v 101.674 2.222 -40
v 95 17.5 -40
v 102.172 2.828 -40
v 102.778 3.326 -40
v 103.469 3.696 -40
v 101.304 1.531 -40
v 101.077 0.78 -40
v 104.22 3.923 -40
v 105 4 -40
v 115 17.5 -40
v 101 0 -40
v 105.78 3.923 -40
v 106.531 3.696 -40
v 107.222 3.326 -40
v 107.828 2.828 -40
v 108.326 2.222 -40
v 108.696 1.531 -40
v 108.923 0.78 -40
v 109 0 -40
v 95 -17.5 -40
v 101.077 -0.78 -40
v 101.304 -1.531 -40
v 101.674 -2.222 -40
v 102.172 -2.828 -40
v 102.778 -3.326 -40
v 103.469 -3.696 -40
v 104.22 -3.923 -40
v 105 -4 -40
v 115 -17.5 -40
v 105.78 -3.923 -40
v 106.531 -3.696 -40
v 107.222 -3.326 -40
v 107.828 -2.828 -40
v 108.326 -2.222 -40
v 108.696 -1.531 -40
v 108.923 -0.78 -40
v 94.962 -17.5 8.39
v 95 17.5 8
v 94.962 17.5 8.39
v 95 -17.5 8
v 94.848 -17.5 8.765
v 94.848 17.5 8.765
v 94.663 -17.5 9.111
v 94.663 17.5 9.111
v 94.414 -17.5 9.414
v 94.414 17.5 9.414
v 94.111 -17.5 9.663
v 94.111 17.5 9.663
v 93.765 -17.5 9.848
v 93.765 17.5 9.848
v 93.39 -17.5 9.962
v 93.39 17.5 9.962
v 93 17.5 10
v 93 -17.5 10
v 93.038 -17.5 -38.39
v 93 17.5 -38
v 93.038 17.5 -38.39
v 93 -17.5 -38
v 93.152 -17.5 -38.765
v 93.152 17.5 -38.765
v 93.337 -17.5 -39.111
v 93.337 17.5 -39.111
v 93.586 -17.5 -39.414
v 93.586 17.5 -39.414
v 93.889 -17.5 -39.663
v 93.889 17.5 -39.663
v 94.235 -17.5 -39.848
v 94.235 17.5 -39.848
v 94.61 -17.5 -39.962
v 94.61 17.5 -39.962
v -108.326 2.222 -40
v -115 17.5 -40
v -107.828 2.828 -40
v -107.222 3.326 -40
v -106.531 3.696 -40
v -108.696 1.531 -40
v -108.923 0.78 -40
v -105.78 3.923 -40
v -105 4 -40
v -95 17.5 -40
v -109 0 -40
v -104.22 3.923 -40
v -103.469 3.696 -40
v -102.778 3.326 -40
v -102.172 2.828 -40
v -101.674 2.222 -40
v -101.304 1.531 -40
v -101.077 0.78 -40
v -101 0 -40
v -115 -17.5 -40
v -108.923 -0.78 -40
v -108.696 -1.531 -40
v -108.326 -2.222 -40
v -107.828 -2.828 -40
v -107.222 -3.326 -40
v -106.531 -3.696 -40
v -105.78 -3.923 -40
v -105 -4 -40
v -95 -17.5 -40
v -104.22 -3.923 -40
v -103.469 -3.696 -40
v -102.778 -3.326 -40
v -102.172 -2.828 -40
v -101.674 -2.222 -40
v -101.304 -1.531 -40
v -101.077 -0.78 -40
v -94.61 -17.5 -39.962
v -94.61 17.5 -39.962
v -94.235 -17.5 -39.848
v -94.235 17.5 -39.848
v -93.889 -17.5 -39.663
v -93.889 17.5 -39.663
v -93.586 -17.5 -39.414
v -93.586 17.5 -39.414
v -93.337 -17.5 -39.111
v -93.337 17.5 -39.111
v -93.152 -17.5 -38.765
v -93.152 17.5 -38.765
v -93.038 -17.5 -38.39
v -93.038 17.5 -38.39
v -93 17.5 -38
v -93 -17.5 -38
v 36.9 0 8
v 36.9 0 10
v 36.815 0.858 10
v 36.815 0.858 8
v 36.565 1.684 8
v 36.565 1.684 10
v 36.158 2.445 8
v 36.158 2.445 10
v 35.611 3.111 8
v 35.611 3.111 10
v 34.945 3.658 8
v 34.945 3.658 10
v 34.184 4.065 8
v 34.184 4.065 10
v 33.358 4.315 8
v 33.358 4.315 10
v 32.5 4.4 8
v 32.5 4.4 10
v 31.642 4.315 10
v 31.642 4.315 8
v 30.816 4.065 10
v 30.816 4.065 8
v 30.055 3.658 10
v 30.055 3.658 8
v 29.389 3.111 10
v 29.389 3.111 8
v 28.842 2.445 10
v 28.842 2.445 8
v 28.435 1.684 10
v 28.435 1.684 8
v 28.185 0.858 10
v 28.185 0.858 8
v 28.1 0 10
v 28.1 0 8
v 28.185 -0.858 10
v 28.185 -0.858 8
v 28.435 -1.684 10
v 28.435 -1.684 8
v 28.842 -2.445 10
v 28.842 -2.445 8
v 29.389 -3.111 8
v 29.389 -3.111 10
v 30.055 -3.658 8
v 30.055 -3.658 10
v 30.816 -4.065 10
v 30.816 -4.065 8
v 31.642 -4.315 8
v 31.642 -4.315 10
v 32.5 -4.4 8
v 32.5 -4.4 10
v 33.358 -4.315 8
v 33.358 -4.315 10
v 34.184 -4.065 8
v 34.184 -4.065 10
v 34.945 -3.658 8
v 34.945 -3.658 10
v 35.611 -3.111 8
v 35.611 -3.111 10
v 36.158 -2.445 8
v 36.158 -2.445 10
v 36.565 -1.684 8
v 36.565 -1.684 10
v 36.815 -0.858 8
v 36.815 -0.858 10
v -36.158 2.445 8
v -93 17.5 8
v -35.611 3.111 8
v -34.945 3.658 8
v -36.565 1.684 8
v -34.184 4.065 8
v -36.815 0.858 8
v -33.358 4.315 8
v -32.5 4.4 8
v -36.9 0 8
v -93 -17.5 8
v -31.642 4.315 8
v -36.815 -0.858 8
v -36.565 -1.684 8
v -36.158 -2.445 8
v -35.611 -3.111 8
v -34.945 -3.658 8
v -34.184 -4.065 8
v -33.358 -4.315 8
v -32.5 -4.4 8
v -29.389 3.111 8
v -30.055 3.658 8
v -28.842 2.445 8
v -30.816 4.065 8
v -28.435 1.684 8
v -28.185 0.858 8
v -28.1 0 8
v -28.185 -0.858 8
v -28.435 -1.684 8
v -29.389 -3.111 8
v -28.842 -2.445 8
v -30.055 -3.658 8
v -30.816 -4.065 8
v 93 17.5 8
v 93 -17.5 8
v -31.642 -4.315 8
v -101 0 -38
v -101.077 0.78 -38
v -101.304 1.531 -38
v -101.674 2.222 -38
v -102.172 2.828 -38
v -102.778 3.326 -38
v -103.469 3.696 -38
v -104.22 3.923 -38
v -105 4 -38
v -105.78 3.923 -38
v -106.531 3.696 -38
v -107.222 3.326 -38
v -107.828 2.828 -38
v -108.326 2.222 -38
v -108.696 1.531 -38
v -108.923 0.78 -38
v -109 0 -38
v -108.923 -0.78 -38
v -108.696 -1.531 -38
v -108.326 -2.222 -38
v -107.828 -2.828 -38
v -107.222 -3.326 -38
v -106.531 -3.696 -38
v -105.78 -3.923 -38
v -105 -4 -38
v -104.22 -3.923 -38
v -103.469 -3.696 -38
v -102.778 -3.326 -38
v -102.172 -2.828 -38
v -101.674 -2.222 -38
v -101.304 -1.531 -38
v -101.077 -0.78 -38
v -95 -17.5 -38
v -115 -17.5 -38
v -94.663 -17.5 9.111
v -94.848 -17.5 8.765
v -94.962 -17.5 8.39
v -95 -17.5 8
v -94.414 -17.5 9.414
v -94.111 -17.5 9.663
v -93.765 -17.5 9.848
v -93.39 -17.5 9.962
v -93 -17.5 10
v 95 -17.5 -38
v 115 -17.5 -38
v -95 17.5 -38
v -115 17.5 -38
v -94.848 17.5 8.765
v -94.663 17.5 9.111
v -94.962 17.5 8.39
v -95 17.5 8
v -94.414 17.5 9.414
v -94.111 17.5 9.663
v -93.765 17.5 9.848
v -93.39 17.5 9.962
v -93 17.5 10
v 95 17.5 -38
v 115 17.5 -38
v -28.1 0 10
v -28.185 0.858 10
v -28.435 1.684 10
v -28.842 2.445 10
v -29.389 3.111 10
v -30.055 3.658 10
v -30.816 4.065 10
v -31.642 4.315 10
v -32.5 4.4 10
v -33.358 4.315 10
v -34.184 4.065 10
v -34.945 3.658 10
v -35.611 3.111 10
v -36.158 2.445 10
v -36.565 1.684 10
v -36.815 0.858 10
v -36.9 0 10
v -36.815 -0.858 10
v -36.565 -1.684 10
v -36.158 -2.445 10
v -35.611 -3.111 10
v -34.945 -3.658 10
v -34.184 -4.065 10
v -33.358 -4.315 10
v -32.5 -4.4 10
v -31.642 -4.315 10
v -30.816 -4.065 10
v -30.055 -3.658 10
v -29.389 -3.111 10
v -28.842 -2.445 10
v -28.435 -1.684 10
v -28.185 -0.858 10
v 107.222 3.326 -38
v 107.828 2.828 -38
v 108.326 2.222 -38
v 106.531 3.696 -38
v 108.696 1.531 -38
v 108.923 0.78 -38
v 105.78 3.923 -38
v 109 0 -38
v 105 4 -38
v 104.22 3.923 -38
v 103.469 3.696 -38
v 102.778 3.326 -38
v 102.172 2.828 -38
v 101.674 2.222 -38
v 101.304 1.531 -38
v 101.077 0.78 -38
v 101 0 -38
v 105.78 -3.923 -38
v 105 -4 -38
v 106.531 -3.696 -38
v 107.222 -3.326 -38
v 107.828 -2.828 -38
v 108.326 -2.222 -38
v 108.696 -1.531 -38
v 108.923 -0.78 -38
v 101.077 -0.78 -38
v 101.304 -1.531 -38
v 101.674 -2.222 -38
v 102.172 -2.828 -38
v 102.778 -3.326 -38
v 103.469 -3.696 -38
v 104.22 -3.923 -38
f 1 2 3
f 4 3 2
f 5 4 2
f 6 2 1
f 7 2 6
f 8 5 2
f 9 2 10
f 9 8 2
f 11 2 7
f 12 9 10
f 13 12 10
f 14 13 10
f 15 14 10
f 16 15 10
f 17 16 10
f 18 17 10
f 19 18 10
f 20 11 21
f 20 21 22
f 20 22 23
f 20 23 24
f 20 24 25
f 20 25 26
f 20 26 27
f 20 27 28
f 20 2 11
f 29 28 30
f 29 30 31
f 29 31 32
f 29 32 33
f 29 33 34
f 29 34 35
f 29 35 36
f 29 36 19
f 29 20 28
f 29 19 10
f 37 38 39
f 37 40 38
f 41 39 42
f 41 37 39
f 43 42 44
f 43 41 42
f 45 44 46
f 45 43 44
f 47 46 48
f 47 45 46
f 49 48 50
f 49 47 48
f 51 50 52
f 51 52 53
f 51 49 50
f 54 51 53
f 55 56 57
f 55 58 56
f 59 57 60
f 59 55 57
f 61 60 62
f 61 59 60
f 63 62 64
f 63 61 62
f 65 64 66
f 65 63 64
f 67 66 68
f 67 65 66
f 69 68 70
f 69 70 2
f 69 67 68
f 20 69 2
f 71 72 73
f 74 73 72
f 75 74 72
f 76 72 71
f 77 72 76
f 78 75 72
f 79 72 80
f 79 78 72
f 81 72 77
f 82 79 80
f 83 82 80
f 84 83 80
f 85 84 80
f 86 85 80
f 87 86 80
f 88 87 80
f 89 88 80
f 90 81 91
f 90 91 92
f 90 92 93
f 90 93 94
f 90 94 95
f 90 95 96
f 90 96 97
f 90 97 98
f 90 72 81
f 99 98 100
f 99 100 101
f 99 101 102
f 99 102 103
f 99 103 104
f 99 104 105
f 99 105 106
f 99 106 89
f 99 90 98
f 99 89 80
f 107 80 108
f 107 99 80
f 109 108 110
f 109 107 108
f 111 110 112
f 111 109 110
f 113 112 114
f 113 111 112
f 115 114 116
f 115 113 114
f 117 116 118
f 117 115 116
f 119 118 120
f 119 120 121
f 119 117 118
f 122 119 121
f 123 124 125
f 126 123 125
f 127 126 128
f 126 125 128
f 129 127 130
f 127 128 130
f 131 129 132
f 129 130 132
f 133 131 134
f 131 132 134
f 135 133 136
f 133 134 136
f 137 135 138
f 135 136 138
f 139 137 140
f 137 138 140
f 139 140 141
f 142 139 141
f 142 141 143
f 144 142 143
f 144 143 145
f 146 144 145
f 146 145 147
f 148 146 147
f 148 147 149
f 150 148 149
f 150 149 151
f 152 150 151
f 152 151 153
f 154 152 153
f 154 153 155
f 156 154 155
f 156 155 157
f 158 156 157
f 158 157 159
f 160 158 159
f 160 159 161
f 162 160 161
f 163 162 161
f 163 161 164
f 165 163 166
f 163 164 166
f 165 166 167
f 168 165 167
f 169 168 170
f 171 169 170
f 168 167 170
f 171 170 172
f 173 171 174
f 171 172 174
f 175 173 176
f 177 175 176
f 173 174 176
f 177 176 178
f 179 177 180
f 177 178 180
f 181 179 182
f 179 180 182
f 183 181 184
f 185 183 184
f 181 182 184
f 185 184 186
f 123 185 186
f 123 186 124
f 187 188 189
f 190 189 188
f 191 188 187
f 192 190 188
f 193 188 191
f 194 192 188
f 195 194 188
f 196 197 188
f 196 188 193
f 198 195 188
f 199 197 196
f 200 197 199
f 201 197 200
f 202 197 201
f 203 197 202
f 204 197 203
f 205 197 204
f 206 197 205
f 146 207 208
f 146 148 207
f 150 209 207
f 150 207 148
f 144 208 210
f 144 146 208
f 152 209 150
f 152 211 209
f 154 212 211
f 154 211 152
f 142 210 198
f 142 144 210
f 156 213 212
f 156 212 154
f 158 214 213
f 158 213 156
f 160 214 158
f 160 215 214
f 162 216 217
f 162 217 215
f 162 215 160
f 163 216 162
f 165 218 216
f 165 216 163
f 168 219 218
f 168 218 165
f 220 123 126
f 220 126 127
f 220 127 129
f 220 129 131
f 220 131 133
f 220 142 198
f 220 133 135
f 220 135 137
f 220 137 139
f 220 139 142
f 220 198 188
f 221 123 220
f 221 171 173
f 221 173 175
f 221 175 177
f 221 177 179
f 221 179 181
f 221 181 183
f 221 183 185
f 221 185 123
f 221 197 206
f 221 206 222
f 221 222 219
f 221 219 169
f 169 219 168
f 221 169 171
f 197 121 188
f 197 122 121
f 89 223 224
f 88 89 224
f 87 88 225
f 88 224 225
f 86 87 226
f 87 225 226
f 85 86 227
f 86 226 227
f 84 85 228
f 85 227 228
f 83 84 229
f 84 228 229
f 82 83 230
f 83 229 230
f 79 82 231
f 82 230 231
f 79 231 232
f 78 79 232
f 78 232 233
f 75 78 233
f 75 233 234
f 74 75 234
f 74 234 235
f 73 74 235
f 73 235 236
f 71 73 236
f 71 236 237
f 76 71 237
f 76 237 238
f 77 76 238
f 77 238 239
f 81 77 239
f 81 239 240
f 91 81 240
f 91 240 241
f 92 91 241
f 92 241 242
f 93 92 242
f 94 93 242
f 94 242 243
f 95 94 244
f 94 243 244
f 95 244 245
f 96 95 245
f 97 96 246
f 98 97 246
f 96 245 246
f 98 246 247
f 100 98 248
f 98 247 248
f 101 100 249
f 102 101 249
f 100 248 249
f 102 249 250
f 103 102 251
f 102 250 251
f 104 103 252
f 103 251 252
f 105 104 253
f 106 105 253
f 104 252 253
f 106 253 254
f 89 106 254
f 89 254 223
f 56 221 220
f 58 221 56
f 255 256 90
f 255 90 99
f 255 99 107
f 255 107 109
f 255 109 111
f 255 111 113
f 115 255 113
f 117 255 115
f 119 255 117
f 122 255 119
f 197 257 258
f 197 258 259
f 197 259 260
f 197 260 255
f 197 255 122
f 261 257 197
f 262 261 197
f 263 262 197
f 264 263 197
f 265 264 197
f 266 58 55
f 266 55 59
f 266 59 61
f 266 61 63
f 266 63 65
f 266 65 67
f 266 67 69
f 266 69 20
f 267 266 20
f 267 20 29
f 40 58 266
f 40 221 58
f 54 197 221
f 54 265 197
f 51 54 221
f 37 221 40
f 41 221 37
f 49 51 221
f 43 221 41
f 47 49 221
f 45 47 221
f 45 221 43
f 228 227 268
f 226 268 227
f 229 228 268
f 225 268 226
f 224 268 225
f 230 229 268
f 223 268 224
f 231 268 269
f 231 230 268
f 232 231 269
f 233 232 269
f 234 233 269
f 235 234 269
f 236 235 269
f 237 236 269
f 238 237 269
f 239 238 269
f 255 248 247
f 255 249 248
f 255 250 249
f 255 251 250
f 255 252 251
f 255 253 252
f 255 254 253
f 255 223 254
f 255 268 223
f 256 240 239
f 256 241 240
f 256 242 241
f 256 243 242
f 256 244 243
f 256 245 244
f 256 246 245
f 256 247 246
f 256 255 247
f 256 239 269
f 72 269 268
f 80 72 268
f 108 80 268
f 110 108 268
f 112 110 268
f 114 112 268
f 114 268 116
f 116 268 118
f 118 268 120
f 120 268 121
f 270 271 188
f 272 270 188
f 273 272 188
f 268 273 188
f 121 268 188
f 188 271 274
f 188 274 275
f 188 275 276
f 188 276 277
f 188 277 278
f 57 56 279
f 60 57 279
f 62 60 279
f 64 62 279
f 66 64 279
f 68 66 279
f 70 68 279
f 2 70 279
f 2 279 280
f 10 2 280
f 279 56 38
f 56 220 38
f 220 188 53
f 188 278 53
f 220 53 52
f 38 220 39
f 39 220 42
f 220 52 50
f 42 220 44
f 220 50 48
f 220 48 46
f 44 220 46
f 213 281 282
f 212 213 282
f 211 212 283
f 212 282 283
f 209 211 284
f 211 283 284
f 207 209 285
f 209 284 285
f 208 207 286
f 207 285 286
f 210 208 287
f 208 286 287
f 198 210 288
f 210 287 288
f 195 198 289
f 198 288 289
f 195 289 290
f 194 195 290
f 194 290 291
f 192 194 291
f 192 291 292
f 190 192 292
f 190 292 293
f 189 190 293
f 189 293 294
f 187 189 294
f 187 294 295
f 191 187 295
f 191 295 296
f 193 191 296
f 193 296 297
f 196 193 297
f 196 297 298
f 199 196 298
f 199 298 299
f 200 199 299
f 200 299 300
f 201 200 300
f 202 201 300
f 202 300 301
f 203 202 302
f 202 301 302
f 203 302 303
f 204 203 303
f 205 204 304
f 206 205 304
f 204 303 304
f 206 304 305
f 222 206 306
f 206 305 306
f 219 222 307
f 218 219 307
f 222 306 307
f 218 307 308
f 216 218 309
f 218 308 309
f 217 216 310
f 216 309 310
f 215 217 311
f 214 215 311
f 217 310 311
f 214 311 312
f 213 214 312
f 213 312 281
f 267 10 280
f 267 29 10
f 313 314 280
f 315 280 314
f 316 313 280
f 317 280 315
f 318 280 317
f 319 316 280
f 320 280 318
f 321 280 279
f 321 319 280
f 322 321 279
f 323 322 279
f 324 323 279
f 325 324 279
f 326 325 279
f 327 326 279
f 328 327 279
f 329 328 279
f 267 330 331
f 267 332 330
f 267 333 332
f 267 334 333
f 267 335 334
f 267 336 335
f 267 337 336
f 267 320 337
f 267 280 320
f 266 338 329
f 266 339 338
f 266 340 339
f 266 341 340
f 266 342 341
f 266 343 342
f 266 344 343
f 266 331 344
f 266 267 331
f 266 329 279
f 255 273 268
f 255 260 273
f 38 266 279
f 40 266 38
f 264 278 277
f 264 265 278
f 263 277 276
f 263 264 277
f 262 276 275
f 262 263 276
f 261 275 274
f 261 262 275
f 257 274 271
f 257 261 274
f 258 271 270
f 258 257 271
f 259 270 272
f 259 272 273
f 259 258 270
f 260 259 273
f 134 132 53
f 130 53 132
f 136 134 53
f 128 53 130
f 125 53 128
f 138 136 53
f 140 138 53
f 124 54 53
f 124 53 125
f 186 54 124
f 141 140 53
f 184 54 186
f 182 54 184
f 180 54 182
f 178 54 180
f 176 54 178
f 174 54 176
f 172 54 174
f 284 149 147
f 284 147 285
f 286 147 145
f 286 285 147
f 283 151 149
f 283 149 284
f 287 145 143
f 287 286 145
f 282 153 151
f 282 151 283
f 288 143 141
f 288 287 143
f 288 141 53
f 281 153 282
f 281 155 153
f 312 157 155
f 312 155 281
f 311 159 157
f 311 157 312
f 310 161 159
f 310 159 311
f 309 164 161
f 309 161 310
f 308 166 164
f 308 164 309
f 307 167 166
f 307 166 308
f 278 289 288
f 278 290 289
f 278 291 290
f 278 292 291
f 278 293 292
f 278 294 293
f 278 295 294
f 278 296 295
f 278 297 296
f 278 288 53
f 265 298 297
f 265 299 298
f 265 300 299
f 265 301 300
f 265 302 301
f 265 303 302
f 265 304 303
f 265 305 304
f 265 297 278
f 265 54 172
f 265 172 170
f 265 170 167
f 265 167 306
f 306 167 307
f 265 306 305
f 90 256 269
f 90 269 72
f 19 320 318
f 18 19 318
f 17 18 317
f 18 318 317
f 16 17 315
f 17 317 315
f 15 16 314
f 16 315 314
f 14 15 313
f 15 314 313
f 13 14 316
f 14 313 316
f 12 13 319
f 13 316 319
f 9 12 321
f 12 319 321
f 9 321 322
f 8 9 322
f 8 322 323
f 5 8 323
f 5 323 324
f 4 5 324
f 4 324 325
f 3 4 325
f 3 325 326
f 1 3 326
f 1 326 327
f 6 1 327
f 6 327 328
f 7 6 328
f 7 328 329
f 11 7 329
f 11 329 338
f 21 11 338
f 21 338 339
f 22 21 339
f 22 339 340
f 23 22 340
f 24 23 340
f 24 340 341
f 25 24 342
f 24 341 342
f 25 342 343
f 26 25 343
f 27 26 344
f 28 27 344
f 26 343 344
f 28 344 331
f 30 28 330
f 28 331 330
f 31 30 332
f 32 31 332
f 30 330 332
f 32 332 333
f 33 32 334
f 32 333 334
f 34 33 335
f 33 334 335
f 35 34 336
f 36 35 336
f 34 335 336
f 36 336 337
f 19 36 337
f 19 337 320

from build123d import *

# Parameters (mm, degrees)
F1_DEPTH = 17.5
F2_R     = 4
F3_DEPTH = 25
F4_R     = 4.4
F5_DEPTH = 25
F6_R     = 2


# Not quite as in the source:
# - a feature names something its author has since deleted; it is built from what else it names


with BuildPart() as f1:
    # F0 (on Front) → F1 (new body, symmetric)
    with BuildSketch(Plane.XZ):
        Polygon((95, -38), (95, 10), (-95, 10), (-95, -38), (-115, -38), (-115, -40), (-93, -40), (-93, 8), (93, 8), (93, -40), (115, -40), (115, -38), align=None)
    extrude(amount=F1_DEPTH, both=True)

    # F2 (on face) → F3 (cut)
    with BuildSketch(Plane.XY.offset(-38)):
        with Locations((-105, 0)):
            Circle(F2_R)
        with Locations((105, 0)):
            Circle(F2_R)
    extrude(amount=-F3_DEPTH, mode=Mode.SUBTRACT)

    # F4 (on face) → F5 (cut)
    with BuildSketch(Plane.XY.offset(10)):
        with Locations((-32.5, 0)):
            Circle(F4_R)
        with Locations((32.5, 0)):
            Circle(F4_R)
    extrude(amount=-F5_DEPTH, mode=Mode.SUBTRACT)

    # F6
    f6_edges = [f1.edges().sort_by_distance(p)[0] for p in [
        (95, 0, 10),
        (-95, 0, 10),
        (-93, 0, -40),
        (93, 0, -40),
    ]]
    fillet(f6_edges, radius=F6_R)


solid = f1.part
